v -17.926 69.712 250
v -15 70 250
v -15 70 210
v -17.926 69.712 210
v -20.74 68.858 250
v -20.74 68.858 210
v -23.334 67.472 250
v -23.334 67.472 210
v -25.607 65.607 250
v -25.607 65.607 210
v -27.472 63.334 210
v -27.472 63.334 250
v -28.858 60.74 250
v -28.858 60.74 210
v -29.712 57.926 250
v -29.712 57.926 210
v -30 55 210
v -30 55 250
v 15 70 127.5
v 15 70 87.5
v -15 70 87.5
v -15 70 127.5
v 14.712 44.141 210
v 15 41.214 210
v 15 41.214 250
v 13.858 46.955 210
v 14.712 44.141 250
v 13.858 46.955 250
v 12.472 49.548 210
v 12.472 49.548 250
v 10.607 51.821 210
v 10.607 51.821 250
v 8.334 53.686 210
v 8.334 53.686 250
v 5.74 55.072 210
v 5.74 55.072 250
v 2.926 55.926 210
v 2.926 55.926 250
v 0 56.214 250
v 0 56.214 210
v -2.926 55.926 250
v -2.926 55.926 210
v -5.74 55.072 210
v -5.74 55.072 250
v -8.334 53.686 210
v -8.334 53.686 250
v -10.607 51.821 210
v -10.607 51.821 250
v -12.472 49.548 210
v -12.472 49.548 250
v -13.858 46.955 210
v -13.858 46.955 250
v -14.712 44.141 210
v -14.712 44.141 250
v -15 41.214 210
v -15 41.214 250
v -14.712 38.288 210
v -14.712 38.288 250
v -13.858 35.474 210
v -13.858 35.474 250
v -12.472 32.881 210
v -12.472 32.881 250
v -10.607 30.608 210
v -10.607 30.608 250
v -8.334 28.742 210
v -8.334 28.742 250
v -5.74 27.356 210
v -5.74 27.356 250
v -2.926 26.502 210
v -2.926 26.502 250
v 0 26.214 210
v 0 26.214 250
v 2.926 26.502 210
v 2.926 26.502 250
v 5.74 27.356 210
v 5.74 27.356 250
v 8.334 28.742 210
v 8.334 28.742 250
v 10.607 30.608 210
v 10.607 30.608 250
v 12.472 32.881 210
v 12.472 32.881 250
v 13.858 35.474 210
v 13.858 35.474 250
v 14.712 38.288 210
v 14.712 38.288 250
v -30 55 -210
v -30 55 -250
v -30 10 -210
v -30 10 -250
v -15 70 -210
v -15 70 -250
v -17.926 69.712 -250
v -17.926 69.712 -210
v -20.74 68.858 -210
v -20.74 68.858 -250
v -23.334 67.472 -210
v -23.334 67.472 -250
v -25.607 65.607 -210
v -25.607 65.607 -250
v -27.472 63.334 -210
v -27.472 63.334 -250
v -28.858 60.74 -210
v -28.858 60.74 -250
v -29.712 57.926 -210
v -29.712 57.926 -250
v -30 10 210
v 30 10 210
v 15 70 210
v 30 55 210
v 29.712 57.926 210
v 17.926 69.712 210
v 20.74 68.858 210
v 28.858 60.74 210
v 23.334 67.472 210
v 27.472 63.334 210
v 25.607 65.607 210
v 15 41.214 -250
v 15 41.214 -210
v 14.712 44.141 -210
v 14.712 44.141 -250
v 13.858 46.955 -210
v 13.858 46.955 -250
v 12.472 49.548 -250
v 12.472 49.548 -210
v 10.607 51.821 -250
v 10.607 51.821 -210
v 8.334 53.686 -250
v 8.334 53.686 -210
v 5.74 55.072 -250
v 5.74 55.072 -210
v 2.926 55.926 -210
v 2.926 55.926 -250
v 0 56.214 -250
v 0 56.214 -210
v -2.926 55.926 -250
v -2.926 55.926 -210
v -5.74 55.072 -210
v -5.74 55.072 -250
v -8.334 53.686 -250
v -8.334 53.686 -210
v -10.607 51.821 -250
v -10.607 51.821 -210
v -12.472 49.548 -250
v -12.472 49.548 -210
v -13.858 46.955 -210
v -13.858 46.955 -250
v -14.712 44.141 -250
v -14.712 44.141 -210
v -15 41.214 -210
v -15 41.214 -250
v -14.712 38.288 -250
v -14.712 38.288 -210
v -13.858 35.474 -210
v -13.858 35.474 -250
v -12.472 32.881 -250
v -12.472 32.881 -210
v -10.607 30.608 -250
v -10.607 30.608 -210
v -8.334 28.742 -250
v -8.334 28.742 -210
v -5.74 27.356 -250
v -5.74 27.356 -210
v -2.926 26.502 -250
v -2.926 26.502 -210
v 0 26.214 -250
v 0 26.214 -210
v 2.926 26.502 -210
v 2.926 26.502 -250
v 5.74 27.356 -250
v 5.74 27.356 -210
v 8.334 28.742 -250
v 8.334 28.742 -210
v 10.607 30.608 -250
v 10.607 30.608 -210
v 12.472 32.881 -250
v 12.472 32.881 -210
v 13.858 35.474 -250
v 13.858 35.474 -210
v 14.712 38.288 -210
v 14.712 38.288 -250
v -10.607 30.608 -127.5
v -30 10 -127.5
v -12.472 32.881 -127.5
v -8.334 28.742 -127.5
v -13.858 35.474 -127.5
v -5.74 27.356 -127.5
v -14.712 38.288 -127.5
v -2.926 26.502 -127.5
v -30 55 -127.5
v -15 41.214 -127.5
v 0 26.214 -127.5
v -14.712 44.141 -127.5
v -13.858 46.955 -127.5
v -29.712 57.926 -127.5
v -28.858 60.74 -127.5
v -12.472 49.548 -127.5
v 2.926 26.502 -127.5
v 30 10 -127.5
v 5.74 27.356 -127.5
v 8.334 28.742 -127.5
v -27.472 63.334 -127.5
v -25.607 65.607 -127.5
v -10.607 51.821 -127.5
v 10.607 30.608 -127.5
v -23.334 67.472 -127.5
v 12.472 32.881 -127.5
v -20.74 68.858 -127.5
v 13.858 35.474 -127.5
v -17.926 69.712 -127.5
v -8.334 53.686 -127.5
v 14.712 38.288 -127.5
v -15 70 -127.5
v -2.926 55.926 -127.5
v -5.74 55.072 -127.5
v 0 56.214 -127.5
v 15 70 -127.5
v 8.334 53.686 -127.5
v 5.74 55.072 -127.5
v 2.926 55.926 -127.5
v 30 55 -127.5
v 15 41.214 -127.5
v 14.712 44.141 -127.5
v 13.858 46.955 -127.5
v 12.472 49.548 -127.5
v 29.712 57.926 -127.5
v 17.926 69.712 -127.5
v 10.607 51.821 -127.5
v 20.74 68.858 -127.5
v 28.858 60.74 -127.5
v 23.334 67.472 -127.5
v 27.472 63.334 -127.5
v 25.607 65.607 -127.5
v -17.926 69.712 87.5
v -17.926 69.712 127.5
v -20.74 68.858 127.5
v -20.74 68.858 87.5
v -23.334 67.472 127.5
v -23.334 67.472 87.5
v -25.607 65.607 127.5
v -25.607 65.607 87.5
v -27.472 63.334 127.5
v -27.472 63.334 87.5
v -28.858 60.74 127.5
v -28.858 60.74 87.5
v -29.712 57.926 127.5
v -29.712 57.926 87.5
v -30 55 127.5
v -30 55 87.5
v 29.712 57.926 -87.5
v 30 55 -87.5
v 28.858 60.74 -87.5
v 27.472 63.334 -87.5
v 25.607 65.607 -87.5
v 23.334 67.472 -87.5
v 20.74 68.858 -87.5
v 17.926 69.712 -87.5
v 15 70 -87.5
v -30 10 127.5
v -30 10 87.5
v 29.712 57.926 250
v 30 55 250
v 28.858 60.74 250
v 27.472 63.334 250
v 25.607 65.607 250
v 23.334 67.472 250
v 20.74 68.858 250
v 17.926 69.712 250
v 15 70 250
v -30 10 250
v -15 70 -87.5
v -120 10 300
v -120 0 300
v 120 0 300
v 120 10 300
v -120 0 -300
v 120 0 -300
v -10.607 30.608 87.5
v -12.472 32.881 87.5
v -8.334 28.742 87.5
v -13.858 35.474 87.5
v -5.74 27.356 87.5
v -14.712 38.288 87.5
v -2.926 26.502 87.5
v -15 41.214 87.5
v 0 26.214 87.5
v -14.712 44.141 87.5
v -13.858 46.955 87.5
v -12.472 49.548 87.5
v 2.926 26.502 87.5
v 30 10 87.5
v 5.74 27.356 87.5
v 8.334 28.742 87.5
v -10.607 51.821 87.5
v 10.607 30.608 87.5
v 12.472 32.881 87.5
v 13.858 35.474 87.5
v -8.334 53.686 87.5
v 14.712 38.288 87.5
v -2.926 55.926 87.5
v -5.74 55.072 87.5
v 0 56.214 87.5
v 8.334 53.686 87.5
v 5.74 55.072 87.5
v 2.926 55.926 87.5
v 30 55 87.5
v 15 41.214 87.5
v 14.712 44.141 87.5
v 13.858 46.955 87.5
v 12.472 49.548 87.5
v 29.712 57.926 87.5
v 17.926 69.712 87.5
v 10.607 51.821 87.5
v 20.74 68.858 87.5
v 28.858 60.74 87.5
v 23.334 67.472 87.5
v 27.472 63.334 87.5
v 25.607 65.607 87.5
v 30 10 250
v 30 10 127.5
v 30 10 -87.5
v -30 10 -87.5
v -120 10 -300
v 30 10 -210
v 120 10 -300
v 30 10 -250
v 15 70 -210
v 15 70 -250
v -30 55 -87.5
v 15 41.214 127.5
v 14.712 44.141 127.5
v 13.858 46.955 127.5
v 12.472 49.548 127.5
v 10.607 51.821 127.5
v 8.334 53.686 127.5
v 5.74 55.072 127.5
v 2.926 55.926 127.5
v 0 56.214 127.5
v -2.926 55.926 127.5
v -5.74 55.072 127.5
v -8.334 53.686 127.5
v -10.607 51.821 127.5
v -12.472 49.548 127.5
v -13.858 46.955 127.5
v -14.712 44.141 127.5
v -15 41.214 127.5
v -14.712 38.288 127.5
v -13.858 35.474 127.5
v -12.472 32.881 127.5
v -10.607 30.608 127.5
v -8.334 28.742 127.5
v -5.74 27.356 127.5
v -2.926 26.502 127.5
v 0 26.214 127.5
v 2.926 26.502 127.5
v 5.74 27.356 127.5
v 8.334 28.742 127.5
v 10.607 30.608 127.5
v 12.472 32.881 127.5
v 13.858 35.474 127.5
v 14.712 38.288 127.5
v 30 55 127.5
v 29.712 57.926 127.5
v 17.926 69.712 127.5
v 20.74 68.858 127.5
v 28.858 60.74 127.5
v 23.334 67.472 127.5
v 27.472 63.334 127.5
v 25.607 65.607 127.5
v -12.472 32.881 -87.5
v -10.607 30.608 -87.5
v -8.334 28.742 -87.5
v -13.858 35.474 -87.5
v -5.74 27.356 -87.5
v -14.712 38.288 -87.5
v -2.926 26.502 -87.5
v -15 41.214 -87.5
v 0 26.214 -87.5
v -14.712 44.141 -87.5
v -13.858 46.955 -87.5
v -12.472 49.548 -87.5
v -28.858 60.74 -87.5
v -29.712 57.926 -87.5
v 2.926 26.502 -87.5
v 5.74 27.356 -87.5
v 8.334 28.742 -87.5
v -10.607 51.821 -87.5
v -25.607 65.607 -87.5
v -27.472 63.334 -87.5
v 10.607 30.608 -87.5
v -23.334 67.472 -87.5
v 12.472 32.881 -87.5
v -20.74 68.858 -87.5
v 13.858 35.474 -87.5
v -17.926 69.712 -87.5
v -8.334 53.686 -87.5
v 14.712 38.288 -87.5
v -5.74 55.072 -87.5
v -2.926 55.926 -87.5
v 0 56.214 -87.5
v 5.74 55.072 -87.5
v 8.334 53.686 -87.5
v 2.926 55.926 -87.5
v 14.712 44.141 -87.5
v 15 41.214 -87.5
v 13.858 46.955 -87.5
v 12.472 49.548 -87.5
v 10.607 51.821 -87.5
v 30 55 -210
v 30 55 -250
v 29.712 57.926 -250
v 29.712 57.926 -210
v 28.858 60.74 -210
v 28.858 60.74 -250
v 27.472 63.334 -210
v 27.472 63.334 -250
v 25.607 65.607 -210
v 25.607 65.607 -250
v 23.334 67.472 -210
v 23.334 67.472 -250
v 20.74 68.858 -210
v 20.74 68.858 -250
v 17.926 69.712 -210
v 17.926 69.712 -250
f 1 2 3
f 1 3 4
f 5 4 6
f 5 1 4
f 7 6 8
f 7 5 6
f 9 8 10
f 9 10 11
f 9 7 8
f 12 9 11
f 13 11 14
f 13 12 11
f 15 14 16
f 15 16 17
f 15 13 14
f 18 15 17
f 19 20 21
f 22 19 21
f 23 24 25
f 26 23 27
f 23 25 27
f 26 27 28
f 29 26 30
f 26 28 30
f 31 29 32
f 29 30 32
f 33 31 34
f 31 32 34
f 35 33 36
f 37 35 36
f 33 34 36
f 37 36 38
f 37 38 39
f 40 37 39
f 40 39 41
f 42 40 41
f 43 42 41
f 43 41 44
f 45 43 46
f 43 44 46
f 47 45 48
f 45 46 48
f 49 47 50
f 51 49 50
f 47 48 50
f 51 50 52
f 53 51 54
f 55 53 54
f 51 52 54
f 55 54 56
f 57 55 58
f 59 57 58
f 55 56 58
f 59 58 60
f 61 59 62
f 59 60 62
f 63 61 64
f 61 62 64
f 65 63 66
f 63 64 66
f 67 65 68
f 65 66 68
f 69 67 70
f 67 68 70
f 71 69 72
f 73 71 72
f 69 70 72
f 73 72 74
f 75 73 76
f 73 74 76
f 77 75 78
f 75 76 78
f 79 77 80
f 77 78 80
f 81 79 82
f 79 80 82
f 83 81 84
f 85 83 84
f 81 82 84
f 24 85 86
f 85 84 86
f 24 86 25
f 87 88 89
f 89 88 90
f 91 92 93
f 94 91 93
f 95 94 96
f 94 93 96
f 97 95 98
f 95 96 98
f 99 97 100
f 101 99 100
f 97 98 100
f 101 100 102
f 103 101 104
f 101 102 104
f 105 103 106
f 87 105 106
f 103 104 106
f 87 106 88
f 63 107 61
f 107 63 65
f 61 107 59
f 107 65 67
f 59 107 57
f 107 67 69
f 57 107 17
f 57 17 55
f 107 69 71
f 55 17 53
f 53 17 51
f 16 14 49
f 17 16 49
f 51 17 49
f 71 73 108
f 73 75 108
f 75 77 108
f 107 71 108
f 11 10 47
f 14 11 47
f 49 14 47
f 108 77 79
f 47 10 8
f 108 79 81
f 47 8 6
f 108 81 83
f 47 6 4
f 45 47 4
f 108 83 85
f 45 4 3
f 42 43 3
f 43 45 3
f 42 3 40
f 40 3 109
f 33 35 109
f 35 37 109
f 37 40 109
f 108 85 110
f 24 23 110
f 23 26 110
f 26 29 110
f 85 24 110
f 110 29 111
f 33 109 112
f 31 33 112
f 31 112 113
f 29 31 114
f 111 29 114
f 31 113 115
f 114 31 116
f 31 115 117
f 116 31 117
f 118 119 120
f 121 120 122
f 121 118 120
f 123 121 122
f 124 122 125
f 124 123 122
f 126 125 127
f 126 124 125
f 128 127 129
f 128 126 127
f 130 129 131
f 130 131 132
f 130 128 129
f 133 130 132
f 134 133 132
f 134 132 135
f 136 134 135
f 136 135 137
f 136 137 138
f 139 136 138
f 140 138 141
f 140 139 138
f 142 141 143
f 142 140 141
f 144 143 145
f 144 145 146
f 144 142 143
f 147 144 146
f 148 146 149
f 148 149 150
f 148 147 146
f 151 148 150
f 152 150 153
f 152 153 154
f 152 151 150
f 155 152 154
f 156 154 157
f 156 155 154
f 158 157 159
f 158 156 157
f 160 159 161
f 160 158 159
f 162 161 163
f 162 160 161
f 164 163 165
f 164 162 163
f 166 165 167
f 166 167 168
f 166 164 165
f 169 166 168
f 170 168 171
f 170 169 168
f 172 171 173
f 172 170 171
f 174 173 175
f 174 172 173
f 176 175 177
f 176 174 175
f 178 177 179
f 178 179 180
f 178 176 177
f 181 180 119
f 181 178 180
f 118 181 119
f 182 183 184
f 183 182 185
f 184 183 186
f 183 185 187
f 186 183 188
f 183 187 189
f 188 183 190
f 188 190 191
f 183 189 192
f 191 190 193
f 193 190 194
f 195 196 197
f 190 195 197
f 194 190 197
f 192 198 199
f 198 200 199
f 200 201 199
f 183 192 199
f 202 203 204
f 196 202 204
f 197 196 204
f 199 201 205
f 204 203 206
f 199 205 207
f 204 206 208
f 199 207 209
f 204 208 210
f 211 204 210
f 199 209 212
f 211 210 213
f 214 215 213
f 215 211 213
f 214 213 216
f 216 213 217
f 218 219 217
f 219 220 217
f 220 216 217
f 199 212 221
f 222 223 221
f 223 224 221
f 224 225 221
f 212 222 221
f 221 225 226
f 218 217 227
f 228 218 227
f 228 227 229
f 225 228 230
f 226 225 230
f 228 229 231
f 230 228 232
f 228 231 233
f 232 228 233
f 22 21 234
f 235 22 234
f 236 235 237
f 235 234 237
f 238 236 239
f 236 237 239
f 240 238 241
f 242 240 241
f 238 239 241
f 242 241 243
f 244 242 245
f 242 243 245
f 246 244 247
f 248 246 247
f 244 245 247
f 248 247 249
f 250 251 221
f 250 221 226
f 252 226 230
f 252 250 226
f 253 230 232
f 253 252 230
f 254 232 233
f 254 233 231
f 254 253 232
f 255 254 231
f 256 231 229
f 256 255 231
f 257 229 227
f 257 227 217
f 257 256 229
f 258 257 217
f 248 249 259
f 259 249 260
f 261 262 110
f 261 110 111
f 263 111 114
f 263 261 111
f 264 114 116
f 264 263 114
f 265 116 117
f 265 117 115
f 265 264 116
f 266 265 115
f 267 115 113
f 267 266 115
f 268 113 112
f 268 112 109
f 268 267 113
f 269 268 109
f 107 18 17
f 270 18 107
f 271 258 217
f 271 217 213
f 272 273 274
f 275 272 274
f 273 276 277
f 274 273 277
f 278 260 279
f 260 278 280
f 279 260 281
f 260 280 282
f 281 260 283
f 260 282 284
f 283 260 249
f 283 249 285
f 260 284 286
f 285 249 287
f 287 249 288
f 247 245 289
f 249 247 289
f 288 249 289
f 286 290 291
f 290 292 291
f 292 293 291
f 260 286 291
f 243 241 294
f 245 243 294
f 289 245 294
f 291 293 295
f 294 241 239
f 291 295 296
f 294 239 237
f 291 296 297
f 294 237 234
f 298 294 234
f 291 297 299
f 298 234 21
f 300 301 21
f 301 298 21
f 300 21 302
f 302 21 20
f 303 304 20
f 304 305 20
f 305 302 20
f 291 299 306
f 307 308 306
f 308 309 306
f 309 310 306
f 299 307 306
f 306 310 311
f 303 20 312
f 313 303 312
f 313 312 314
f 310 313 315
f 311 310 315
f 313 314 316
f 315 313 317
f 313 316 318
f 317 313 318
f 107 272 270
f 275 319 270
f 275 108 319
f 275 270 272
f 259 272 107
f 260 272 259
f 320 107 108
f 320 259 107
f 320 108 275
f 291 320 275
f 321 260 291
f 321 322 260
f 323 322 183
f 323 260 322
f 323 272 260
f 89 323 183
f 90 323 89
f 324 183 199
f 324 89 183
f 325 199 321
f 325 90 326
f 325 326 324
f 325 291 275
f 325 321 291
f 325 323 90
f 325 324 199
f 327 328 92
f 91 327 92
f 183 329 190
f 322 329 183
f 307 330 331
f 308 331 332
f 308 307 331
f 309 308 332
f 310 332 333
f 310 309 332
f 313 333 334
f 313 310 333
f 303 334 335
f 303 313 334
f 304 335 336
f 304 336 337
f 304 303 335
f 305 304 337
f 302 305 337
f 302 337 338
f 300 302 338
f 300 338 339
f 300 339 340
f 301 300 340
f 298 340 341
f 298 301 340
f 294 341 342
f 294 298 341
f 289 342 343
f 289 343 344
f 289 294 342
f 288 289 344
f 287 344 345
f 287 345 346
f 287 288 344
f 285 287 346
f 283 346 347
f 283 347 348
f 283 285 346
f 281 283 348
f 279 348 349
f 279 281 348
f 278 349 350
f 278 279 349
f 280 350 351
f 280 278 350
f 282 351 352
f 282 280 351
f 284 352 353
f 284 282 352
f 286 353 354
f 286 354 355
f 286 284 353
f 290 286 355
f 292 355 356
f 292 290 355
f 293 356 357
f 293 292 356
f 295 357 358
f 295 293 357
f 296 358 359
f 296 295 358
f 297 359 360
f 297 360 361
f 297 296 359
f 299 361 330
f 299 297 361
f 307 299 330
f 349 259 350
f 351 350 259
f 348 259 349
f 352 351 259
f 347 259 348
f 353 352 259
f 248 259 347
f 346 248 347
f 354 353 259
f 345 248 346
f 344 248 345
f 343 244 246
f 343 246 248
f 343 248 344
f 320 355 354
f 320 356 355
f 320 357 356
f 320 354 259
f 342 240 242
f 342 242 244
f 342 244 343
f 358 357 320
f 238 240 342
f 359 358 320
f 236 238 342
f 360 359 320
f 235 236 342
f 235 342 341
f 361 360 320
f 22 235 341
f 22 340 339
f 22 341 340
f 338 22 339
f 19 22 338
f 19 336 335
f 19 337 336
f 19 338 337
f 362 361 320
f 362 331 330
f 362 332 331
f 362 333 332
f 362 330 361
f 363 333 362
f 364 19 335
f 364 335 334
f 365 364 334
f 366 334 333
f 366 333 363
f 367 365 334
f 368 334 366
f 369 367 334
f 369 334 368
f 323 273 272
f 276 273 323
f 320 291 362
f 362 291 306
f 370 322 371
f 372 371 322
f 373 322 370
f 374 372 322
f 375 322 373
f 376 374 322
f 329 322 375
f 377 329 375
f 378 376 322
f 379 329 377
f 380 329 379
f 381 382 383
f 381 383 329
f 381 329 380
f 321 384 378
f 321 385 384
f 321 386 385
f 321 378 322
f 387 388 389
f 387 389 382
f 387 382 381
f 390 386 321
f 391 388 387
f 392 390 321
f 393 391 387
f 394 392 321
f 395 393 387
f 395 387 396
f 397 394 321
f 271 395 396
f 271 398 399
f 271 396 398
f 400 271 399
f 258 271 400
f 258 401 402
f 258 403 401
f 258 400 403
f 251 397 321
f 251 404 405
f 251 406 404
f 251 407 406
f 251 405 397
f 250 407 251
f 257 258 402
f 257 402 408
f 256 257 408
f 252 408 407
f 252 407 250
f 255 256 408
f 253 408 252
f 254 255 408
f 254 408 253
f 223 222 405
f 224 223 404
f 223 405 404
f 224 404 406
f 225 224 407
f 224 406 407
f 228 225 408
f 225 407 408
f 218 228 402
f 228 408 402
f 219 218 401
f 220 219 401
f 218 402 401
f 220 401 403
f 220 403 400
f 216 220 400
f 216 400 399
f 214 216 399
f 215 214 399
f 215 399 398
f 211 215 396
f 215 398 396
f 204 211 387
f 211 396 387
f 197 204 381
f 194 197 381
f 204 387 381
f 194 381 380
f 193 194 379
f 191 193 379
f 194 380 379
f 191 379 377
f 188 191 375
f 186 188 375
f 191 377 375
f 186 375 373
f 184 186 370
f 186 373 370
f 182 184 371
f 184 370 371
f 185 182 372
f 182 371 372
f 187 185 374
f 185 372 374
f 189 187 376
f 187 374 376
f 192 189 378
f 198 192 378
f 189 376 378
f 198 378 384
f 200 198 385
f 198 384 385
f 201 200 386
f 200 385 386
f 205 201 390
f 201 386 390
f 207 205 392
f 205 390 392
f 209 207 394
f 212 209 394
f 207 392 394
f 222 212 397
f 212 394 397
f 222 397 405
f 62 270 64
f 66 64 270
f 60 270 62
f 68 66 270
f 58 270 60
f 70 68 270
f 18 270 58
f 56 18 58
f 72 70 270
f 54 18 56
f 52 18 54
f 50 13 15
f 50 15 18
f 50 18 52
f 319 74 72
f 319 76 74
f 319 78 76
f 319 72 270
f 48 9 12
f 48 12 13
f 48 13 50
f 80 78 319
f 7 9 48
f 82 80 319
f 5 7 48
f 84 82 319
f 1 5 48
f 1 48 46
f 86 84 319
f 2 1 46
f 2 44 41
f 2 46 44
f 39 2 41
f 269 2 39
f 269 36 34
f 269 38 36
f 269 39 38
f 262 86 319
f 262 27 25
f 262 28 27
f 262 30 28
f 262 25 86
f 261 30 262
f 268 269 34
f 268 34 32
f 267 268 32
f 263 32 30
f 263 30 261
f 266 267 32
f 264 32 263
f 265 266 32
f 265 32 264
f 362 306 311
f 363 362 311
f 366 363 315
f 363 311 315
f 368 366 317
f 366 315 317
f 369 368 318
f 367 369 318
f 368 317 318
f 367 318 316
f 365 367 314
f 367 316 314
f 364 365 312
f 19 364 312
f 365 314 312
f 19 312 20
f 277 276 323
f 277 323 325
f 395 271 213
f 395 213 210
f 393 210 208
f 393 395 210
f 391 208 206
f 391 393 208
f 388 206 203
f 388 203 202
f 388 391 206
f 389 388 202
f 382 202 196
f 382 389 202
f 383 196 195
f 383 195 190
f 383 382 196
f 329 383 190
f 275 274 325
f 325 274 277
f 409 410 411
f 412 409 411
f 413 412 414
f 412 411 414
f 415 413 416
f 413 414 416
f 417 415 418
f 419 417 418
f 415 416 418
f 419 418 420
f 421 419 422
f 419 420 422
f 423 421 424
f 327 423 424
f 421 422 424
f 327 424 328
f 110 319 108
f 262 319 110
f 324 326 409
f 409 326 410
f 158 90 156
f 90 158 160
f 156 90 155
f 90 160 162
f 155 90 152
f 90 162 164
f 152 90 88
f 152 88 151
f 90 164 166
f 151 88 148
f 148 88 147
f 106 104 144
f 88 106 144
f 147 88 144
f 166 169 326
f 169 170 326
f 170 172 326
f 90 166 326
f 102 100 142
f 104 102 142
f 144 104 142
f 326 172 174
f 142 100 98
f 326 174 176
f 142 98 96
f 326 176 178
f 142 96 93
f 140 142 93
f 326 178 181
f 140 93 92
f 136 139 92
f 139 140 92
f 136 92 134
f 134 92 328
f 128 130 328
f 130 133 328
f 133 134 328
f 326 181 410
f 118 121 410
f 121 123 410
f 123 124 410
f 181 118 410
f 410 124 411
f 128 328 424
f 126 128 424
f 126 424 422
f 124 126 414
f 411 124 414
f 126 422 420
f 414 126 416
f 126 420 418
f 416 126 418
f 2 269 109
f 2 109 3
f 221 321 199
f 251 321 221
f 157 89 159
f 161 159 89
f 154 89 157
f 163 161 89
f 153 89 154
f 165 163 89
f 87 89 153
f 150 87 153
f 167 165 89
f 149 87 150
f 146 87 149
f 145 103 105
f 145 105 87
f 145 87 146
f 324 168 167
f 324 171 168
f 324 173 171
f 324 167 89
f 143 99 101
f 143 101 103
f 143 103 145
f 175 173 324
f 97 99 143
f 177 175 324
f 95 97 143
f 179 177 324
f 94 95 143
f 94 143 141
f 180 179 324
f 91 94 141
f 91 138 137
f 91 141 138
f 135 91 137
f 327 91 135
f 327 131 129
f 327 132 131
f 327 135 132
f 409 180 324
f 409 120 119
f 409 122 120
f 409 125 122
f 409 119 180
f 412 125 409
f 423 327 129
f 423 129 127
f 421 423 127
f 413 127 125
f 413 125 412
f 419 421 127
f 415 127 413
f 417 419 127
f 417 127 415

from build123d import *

# Parameters (mm, degrees)
SKETCH1_W               = 240
SKETCH1_H               = 600
EXTRUDE1_DEPTH          = 10
SKETCH2_R               = 15
EXTRUDE2_DEPTH          = 40
MIRROR2_COPY_1_SKETCH_R = 15
MIRROR2_COPY_1_DEPTH    = 40


with BuildPart() as part:
    # Sketch1 → Extrude1 (new body)
    with BuildSketch(Plane(origin=(0, 0, 0), x_dir=(1, 0, 0), z_dir=(0, 1, 0))):
        Rectangle(SKETCH1_W, SKETCH1_H)
    extrude(amount=EXTRUDE1_DEPTH)

    # Sketch2 → Extrude2 (add)
    with BuildSketch(Plane.XY.offset(250)):
        with BuildLine():
            Line((-30, 10), (30, 10))
            Line((30, 10), (30, 55))
            ThreePointArc((30, 55), (25.606601718, 65.606601718), (15, 70))
            Line((15, 70), (-15, 70))
            ThreePointArc((-15, 70), (-25.606601718, 65.606601718), (-30, 55))
            Line((-30, 55), (-30, 10))
        make_face()
        with Locations((0, 41.214252503)):
            Circle(SKETCH2_R, mode=Mode.SUBTRACT)
    extrude2 = extrude(amount=-EXTRUDE2_DEPTH)

    # Mirror1: Extrude2 across plane
    add(extrude2.mirror(Plane.XY.offset(168.75)))

    # Mirror2: Extrude2 across plane
    add(extrude2.mirror(Plane.XY))

    # Mirror2 copy 1 sketch → Mirror2 copy 1 (add)
    with BuildSketch(Plane.XY.offset(-87.5)):
        with BuildLine():
            Line((-30, 10), (30, 10))
            Line((30, 10), (30, 55))
            ThreePointArc((30, 55), (25.606601718, 65.606601718), (15, 70))
            Line((15, 70), (-15, 70))
            ThreePointArc((-15, 70), (-25.606601718, 65.606601718), (-30, 55))
            Line((-30, 55), (-30, 10))
        make_face()
        with Locations((0, 41.214252503)):
            Circle(MIRROR2_COPY_1_SKETCH_R, mode=Mode.SUBTRACT)
    extrude(amount=-MIRROR2_COPY_1_DEPTH)


solid = part.part
